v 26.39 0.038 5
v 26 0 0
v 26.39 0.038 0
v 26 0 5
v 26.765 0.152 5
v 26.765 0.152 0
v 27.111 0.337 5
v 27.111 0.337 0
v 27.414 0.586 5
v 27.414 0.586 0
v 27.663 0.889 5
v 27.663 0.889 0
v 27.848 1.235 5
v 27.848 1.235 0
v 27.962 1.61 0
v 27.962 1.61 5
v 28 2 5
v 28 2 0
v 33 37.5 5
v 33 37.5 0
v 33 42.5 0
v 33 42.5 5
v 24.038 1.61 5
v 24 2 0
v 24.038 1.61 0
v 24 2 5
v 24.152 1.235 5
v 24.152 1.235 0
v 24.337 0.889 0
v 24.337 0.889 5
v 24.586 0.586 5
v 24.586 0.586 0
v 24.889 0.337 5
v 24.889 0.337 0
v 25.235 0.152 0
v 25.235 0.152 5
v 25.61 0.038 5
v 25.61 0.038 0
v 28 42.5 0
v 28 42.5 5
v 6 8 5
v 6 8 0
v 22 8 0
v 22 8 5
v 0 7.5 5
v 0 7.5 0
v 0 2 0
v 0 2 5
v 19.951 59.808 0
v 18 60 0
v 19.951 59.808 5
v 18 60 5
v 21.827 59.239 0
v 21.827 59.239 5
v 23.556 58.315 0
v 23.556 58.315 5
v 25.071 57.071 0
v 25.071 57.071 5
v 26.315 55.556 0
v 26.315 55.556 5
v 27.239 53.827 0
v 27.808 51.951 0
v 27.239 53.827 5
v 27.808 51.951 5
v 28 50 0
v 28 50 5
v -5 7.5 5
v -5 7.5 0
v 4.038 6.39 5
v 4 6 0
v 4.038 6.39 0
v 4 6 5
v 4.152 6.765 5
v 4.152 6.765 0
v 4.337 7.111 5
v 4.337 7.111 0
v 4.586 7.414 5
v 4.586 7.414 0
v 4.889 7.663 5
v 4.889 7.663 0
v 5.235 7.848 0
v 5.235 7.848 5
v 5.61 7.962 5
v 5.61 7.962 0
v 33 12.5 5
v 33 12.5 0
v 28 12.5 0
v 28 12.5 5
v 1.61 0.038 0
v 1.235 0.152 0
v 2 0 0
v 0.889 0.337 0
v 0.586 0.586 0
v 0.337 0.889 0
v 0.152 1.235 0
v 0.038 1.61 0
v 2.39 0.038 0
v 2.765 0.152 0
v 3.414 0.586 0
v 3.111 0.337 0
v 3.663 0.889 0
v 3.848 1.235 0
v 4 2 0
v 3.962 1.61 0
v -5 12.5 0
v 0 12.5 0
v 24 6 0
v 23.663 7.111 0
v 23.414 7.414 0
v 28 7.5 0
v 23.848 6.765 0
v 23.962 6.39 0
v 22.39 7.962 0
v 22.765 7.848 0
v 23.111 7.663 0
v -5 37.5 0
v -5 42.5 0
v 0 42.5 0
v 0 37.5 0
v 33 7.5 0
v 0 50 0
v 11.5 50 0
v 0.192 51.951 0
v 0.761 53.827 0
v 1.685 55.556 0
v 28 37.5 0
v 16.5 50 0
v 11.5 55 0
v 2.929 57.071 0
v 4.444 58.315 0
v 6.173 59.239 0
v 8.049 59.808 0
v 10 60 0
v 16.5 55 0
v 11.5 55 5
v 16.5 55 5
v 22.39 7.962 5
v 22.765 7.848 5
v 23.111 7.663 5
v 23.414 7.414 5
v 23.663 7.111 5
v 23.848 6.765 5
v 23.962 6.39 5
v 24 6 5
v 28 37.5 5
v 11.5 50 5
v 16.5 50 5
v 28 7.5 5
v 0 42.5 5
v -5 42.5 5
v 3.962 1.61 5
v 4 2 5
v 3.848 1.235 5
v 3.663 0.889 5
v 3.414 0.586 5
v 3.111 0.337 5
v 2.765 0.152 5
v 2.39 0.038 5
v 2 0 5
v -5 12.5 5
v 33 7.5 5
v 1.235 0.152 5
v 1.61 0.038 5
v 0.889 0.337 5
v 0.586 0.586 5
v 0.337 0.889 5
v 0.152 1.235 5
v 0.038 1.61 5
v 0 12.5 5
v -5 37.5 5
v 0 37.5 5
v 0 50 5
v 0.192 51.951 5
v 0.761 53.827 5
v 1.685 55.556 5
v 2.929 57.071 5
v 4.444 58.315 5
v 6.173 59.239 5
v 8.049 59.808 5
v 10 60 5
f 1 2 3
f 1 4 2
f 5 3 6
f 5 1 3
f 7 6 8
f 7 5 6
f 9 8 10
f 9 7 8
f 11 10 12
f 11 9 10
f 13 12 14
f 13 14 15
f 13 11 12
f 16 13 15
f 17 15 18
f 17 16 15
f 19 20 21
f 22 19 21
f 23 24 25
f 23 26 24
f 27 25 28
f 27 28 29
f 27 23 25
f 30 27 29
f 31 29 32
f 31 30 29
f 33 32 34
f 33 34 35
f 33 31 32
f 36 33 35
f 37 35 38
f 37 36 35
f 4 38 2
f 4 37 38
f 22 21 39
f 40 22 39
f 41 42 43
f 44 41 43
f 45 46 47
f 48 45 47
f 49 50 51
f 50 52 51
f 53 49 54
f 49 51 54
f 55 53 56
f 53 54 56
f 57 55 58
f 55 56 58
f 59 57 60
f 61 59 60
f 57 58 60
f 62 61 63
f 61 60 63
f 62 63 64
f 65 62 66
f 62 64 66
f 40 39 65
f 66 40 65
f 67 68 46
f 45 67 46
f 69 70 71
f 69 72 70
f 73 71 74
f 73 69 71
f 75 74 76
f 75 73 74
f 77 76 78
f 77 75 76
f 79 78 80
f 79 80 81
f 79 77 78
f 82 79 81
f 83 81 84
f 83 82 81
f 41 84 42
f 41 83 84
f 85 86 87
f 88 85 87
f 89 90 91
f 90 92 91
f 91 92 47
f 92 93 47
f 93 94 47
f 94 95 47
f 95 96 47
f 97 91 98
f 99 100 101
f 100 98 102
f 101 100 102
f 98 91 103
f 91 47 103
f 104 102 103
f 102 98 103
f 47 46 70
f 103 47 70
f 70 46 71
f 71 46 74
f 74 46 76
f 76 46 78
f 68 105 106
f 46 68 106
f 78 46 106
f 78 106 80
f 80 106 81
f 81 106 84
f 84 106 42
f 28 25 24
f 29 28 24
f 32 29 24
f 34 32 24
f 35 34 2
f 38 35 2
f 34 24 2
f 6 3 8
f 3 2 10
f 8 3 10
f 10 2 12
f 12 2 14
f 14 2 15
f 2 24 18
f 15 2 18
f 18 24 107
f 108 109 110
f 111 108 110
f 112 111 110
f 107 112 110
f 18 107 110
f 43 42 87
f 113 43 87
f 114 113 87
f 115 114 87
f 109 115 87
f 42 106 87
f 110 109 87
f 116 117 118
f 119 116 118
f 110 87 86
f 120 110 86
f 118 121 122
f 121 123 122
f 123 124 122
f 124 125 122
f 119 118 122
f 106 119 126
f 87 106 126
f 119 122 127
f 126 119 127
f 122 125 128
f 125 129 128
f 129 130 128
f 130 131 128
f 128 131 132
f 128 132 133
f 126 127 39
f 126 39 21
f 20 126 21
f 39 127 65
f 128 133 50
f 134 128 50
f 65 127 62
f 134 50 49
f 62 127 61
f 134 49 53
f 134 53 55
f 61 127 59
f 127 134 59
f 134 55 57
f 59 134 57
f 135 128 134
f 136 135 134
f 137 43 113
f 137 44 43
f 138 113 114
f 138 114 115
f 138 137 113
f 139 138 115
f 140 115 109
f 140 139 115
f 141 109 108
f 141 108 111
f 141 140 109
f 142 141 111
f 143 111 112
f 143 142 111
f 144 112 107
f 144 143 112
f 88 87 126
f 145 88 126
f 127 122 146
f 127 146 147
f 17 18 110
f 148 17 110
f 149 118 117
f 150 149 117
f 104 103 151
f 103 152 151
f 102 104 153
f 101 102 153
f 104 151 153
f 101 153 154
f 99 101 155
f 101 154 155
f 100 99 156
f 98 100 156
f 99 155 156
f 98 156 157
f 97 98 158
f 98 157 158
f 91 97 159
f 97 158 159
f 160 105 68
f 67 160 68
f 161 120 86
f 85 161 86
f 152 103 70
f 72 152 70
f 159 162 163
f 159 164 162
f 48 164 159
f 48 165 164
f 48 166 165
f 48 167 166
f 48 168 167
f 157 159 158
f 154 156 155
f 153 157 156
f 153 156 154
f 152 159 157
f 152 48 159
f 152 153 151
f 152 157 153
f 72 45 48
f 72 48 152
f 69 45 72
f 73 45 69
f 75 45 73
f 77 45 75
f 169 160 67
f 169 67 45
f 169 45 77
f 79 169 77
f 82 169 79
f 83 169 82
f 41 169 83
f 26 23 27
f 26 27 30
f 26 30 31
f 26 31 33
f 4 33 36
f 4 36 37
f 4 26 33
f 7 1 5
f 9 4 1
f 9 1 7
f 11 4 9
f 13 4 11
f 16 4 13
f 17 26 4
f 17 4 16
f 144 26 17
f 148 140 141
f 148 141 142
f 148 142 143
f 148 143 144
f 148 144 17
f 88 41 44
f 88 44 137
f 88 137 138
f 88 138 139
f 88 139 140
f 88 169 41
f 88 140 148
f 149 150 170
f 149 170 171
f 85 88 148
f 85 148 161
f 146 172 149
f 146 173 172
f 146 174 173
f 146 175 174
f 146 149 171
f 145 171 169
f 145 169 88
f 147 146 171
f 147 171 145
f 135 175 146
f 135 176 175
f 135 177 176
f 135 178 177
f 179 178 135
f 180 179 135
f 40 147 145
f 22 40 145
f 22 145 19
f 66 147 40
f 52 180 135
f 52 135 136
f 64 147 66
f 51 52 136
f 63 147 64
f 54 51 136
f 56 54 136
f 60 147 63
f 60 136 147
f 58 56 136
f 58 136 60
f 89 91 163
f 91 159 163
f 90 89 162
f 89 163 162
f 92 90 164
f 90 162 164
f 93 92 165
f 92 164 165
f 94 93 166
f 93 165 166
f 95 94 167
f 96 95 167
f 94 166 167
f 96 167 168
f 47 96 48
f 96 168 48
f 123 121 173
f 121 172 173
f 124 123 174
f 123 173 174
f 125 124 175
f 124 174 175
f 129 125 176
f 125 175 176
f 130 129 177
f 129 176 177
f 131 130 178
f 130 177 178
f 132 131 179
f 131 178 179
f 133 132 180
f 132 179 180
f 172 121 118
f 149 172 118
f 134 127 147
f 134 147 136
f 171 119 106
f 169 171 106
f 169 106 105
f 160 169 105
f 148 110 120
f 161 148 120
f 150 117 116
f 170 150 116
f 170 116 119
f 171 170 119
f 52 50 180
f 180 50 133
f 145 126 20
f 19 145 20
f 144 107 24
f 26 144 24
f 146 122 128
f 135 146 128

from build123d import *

# Parameters (mm, degrees)
ESQUISSE1_W        = 5
ESQUISSE1_H        = 5
BOSS_EXTRU_1_DEPTH = 5
CONG_1_R           = 2
CONG_2_R           = 2
CONG_3_R           = 10


with BuildPart() as part:
    # Esquisse1 → Boss.-Extru.1 (new body)
    with BuildSketch(Plane.XY):
        Polygon((0, 0), (4, 0), (4, 8), (24, 8), (24, 0), (28, 0), (28, 7.5), (33, 7.5), (33, 12.5), (28, 12.5), (28, 37.5), (33, 37.5), (33, 42.5), (28, 42.5), (28, 60), (0, 60), (0, 42.5), (-5, 42.5), (-5, 37.5), (0, 37.5), (0, 12.5), (-5, 12.5), (-5, 7.5), (0, 7.5), align=None)
        with Locations((14, 52.5)):
            Rectangle(ESQUISSE1_W, ESQUISSE1_H, mode=Mode.SUBTRACT)
    extrude(amount=BOSS_EXTRU_1_DEPTH)

    # Congé1
    cong_1_edges = [part.edges().sort_by_distance(p)[0] for p in [
        (24, 8, 2.5),
        (4, 8, 2.5),
    ]]
    fillet(cong_1_edges, radius=CONG_1_R)

    # Congé2
    cong_2_edges = [part.edges().sort_by_distance(p)[0] for p in [
        (24, 0, 2.5),
        (28, 0, 2.5),
        (0, 0, 2.5),
        (4, 0, 2.5),
    ]]
    fillet(cong_2_edges, radius=CONG_2_R - 0.0001)  # a hair under: the kernel refuses the full size

    # Congé3
    cong_3_edges = [part.edges().sort_by_distance(p)[0] for p in [
        (0, 60, 2.5),
        (28, 60, 2.5),
    ]]
    fillet(cong_3_edges, radius=CONG_3_R)


solid = part.part
